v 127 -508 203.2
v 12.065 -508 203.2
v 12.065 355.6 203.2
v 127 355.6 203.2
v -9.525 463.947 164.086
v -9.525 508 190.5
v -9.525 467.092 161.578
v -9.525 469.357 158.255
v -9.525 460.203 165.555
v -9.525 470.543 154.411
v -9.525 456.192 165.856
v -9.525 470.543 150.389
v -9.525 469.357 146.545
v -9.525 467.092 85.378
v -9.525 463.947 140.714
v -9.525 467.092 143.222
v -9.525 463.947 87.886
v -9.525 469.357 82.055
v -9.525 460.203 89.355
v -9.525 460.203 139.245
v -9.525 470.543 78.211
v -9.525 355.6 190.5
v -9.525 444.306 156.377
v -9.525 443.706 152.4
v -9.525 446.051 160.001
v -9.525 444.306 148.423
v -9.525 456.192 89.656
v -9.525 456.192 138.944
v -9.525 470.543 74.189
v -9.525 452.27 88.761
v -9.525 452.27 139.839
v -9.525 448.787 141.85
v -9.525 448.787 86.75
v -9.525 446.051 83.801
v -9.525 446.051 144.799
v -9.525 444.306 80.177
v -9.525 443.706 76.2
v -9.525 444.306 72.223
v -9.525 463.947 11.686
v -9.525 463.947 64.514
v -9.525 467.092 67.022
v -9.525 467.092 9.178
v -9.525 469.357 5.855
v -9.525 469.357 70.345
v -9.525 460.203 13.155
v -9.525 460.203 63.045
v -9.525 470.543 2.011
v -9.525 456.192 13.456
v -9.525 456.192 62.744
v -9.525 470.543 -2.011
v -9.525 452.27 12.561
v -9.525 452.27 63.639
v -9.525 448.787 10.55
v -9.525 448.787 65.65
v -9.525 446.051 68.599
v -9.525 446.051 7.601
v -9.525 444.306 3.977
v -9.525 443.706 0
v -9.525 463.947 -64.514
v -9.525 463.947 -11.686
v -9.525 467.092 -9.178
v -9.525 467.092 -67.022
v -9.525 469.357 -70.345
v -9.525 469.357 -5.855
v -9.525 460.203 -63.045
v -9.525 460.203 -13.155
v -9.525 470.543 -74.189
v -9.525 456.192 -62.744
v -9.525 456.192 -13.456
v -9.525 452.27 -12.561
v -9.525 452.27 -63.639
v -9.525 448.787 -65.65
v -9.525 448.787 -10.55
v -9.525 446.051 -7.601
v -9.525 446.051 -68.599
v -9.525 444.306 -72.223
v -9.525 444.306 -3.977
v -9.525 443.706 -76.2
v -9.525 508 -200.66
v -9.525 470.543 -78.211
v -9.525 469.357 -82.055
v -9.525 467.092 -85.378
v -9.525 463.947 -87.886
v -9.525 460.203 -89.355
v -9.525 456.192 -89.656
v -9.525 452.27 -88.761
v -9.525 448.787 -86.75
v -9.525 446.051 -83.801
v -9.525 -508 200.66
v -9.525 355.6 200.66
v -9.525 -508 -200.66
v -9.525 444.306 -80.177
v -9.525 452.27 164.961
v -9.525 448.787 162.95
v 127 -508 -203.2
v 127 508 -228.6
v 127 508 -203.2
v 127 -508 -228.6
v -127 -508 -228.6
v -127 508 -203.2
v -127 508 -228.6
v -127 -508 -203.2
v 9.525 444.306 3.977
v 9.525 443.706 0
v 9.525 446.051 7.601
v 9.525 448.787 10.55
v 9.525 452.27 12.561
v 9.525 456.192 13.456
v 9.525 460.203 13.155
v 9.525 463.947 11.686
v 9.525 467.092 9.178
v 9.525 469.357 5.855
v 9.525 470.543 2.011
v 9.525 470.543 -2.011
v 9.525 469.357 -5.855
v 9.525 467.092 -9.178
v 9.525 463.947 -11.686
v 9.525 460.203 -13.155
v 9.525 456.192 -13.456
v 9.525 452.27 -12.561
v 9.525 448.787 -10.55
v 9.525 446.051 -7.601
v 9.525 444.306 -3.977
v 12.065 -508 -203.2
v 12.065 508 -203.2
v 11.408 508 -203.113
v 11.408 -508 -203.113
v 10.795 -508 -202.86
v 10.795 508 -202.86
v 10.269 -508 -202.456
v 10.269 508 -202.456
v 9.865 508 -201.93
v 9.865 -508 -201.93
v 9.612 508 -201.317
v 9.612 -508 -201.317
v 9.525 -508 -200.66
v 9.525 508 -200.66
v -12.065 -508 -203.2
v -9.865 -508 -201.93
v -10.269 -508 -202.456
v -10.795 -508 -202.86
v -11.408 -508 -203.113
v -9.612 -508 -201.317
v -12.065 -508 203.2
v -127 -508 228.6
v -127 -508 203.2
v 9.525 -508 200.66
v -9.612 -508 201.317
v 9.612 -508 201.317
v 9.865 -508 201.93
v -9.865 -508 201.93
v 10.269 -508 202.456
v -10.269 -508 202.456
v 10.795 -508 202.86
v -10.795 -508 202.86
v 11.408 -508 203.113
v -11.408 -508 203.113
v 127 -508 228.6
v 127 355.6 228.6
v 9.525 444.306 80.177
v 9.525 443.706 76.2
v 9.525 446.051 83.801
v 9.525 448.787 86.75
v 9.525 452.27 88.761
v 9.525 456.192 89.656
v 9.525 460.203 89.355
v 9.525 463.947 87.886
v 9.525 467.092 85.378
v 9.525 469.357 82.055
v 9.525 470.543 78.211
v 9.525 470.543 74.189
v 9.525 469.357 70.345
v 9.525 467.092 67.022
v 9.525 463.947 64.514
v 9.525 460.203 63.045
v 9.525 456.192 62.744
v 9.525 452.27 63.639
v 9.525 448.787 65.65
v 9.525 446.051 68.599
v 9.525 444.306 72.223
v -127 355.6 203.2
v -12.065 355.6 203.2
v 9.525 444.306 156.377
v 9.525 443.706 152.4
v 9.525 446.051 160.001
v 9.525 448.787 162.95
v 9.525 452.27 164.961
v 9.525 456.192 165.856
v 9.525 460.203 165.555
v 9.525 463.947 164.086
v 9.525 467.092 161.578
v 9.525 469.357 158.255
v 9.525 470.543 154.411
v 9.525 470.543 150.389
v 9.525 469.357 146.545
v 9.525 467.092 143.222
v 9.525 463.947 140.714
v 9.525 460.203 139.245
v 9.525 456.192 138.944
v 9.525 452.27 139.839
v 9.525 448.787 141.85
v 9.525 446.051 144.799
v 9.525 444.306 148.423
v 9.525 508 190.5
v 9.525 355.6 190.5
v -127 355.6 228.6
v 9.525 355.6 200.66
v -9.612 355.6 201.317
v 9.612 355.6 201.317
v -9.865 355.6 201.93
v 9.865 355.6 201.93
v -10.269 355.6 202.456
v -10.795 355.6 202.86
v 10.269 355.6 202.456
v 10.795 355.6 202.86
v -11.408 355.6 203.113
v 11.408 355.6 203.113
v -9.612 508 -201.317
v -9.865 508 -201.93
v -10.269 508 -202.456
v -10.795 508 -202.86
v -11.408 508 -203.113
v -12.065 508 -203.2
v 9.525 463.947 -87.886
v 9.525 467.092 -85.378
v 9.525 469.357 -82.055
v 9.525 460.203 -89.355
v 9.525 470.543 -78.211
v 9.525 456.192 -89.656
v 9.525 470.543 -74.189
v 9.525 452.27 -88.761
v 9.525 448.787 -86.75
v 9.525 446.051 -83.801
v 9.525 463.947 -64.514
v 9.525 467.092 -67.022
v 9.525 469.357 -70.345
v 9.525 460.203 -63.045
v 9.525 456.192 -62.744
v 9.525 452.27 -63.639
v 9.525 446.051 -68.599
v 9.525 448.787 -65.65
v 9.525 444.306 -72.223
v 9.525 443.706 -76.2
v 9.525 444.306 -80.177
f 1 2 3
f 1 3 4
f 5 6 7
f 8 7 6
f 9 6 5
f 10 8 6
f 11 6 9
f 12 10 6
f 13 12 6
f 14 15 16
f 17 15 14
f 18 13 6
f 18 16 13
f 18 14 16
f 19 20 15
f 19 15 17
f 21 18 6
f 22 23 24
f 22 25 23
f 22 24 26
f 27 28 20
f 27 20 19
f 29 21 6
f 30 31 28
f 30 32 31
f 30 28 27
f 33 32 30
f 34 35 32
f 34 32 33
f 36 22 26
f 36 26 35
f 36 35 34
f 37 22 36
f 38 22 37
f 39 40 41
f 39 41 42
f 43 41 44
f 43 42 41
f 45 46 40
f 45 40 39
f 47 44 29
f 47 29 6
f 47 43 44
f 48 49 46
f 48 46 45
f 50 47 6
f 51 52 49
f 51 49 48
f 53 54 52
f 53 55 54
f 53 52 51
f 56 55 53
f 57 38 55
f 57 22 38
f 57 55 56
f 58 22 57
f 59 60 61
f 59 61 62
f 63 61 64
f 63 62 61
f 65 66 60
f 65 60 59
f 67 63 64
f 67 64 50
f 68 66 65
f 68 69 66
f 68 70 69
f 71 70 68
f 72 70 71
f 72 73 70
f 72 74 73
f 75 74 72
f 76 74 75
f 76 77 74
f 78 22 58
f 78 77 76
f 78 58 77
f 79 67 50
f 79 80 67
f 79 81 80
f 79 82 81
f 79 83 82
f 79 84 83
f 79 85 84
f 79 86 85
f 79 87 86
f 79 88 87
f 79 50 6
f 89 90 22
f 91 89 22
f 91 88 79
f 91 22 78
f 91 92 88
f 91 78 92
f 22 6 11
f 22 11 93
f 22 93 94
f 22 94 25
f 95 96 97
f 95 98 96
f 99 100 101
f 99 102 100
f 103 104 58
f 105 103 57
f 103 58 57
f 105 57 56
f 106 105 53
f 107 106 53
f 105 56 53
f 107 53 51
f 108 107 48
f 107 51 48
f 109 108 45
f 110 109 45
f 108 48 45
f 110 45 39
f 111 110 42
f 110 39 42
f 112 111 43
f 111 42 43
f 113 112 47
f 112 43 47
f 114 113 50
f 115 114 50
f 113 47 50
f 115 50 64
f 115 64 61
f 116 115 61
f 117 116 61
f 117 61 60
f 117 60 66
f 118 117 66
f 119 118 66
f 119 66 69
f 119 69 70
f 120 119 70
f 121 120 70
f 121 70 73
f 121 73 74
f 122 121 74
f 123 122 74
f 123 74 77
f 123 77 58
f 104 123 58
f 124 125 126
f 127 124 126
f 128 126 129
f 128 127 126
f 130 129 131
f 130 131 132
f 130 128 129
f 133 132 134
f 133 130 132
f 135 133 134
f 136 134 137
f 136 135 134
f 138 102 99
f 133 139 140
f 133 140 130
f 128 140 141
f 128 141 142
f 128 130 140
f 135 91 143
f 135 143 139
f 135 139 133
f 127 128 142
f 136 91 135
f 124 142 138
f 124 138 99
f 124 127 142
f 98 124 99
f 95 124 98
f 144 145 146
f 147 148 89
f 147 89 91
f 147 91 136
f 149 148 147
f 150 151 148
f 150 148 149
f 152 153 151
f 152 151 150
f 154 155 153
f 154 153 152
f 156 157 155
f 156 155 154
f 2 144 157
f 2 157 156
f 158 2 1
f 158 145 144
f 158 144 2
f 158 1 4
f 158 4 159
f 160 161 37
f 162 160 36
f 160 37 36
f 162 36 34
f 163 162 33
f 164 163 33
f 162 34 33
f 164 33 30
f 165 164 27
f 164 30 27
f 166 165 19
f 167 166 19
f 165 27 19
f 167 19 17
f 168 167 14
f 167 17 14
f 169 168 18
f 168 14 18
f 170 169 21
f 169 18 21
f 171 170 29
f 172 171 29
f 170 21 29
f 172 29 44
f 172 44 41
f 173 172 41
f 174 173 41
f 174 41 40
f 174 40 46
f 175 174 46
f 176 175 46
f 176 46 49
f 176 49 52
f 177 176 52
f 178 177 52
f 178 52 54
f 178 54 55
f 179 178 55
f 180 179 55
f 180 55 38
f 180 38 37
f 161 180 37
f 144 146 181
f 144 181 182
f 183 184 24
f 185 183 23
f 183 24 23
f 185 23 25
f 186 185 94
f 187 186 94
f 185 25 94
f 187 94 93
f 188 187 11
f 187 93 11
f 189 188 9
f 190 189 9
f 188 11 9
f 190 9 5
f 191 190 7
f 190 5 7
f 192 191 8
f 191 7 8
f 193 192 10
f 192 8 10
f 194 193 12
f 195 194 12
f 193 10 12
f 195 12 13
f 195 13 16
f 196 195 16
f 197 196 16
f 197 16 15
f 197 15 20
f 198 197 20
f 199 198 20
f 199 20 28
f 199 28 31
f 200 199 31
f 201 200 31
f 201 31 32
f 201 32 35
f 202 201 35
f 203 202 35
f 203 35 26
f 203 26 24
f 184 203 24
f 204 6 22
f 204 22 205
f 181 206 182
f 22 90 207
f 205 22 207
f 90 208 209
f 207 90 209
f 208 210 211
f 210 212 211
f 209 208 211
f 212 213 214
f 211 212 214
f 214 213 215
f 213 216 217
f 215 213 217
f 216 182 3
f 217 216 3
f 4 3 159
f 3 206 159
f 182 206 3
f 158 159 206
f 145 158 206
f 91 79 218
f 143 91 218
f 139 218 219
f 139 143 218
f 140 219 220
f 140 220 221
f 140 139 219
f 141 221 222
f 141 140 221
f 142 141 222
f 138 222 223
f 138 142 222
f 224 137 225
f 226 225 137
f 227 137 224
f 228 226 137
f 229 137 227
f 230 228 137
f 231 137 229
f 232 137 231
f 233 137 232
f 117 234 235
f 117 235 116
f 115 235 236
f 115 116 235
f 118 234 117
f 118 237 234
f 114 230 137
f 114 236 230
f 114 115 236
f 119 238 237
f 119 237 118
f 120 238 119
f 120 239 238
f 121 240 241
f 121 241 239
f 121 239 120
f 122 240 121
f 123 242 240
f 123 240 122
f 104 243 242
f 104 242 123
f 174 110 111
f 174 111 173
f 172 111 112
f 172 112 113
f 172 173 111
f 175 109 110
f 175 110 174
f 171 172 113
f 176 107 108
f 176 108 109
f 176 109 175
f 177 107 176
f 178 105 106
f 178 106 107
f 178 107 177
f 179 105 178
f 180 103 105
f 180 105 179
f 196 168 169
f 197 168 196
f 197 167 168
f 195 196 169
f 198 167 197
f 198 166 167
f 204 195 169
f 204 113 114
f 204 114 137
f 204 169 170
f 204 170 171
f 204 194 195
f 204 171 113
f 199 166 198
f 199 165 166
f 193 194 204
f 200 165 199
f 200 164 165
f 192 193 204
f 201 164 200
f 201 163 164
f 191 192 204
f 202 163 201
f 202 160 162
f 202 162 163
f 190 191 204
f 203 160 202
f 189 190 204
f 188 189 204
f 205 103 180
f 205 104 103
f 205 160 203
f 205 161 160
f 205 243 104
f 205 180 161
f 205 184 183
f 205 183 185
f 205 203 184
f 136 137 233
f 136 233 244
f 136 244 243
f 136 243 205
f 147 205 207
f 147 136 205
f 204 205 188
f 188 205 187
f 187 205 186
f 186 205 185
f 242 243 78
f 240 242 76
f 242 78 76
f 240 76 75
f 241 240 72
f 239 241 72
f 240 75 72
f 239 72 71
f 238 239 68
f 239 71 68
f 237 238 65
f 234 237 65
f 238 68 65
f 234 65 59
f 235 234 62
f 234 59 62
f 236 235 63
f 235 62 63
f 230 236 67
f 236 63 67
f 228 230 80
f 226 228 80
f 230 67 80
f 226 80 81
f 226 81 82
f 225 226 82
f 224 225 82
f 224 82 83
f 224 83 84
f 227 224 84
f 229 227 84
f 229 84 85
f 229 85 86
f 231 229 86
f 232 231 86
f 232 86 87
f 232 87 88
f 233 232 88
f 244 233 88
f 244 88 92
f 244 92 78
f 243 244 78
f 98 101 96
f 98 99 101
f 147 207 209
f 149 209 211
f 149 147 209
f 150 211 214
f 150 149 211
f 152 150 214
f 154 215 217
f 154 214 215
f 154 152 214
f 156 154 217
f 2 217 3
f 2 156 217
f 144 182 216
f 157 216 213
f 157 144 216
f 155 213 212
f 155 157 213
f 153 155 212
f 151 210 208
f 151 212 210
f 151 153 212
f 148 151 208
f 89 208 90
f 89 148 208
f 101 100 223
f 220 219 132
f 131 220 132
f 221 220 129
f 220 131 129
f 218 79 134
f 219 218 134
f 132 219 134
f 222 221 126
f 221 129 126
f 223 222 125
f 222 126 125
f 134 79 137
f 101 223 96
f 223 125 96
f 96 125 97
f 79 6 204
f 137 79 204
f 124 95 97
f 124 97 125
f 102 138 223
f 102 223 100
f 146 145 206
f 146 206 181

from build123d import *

# Parameters (mm, degrees)
F1_DEPTH = 508
F3_D     = 26.9875
F4_W     = 254
F4_H     = 152.4
F5_DEPTH = 38.1


with BuildPart() as f1:
    # F0 (on Front) → F1 (new body, symmetric)
    with BuildSketch(Plane.XZ):
        with BuildLine():
            Line((127, -228.6), (127, -203.2))
            Line((127, -203.2), (12.065, -203.2))
            ThreePointArc((12.065, -203.2), (10.268949, -202.456051), (9.525, -200.66))
            Line((9.525, -200.66), (9.525, 200.66))
            ThreePointArc((9.525, 200.66), (10.268949, 202.456051), (12.065, 203.2))
            Line((12.065, 203.2), (127, 203.2))
            Line((127, 203.2), (127, 228.6))
            Line((127, 228.6), (-127, 228.6))
            Line((-127, 228.6), (-127, 203.2))
            Line((-127, 203.2), (-12.065, 203.2))
            ThreePointArc((-12.065, 203.2), (-10.268949, 202.456051), (-9.525, 200.66))
            Line((-9.525, 200.66), (-9.525, -200.66))
            ThreePointArc((-9.525, -200.66), (-10.268949, -202.456051), (-12.065, -203.2))
            Line((-12.065, -203.2), (-127, -203.2))
            Line((-127, -203.2), (-127, -228.6))
            Line((-127, -228.6), (127, -228.6))
        make_face()
    extrude(amount=F1_DEPTH, both=True)

    # F3 (through all)
    with Locations(Plane.YZ.offset(9.525)):
        with Locations((457.2, 152.4), (457.2, 76.2), (457.2, 0), (457.2, -76.2)):
            Hole(F3_D / 2)

    # F4 (on face) → F5 (cut)
    with BuildSketch(Plane.XY.offset(228.6)):
        with Locations((0, 431.8)):
            Rectangle(F4_W, F4_H)
    extrude(amount=-F5_DEPTH, mode=Mode.SUBTRACT)


solid = f1.part
